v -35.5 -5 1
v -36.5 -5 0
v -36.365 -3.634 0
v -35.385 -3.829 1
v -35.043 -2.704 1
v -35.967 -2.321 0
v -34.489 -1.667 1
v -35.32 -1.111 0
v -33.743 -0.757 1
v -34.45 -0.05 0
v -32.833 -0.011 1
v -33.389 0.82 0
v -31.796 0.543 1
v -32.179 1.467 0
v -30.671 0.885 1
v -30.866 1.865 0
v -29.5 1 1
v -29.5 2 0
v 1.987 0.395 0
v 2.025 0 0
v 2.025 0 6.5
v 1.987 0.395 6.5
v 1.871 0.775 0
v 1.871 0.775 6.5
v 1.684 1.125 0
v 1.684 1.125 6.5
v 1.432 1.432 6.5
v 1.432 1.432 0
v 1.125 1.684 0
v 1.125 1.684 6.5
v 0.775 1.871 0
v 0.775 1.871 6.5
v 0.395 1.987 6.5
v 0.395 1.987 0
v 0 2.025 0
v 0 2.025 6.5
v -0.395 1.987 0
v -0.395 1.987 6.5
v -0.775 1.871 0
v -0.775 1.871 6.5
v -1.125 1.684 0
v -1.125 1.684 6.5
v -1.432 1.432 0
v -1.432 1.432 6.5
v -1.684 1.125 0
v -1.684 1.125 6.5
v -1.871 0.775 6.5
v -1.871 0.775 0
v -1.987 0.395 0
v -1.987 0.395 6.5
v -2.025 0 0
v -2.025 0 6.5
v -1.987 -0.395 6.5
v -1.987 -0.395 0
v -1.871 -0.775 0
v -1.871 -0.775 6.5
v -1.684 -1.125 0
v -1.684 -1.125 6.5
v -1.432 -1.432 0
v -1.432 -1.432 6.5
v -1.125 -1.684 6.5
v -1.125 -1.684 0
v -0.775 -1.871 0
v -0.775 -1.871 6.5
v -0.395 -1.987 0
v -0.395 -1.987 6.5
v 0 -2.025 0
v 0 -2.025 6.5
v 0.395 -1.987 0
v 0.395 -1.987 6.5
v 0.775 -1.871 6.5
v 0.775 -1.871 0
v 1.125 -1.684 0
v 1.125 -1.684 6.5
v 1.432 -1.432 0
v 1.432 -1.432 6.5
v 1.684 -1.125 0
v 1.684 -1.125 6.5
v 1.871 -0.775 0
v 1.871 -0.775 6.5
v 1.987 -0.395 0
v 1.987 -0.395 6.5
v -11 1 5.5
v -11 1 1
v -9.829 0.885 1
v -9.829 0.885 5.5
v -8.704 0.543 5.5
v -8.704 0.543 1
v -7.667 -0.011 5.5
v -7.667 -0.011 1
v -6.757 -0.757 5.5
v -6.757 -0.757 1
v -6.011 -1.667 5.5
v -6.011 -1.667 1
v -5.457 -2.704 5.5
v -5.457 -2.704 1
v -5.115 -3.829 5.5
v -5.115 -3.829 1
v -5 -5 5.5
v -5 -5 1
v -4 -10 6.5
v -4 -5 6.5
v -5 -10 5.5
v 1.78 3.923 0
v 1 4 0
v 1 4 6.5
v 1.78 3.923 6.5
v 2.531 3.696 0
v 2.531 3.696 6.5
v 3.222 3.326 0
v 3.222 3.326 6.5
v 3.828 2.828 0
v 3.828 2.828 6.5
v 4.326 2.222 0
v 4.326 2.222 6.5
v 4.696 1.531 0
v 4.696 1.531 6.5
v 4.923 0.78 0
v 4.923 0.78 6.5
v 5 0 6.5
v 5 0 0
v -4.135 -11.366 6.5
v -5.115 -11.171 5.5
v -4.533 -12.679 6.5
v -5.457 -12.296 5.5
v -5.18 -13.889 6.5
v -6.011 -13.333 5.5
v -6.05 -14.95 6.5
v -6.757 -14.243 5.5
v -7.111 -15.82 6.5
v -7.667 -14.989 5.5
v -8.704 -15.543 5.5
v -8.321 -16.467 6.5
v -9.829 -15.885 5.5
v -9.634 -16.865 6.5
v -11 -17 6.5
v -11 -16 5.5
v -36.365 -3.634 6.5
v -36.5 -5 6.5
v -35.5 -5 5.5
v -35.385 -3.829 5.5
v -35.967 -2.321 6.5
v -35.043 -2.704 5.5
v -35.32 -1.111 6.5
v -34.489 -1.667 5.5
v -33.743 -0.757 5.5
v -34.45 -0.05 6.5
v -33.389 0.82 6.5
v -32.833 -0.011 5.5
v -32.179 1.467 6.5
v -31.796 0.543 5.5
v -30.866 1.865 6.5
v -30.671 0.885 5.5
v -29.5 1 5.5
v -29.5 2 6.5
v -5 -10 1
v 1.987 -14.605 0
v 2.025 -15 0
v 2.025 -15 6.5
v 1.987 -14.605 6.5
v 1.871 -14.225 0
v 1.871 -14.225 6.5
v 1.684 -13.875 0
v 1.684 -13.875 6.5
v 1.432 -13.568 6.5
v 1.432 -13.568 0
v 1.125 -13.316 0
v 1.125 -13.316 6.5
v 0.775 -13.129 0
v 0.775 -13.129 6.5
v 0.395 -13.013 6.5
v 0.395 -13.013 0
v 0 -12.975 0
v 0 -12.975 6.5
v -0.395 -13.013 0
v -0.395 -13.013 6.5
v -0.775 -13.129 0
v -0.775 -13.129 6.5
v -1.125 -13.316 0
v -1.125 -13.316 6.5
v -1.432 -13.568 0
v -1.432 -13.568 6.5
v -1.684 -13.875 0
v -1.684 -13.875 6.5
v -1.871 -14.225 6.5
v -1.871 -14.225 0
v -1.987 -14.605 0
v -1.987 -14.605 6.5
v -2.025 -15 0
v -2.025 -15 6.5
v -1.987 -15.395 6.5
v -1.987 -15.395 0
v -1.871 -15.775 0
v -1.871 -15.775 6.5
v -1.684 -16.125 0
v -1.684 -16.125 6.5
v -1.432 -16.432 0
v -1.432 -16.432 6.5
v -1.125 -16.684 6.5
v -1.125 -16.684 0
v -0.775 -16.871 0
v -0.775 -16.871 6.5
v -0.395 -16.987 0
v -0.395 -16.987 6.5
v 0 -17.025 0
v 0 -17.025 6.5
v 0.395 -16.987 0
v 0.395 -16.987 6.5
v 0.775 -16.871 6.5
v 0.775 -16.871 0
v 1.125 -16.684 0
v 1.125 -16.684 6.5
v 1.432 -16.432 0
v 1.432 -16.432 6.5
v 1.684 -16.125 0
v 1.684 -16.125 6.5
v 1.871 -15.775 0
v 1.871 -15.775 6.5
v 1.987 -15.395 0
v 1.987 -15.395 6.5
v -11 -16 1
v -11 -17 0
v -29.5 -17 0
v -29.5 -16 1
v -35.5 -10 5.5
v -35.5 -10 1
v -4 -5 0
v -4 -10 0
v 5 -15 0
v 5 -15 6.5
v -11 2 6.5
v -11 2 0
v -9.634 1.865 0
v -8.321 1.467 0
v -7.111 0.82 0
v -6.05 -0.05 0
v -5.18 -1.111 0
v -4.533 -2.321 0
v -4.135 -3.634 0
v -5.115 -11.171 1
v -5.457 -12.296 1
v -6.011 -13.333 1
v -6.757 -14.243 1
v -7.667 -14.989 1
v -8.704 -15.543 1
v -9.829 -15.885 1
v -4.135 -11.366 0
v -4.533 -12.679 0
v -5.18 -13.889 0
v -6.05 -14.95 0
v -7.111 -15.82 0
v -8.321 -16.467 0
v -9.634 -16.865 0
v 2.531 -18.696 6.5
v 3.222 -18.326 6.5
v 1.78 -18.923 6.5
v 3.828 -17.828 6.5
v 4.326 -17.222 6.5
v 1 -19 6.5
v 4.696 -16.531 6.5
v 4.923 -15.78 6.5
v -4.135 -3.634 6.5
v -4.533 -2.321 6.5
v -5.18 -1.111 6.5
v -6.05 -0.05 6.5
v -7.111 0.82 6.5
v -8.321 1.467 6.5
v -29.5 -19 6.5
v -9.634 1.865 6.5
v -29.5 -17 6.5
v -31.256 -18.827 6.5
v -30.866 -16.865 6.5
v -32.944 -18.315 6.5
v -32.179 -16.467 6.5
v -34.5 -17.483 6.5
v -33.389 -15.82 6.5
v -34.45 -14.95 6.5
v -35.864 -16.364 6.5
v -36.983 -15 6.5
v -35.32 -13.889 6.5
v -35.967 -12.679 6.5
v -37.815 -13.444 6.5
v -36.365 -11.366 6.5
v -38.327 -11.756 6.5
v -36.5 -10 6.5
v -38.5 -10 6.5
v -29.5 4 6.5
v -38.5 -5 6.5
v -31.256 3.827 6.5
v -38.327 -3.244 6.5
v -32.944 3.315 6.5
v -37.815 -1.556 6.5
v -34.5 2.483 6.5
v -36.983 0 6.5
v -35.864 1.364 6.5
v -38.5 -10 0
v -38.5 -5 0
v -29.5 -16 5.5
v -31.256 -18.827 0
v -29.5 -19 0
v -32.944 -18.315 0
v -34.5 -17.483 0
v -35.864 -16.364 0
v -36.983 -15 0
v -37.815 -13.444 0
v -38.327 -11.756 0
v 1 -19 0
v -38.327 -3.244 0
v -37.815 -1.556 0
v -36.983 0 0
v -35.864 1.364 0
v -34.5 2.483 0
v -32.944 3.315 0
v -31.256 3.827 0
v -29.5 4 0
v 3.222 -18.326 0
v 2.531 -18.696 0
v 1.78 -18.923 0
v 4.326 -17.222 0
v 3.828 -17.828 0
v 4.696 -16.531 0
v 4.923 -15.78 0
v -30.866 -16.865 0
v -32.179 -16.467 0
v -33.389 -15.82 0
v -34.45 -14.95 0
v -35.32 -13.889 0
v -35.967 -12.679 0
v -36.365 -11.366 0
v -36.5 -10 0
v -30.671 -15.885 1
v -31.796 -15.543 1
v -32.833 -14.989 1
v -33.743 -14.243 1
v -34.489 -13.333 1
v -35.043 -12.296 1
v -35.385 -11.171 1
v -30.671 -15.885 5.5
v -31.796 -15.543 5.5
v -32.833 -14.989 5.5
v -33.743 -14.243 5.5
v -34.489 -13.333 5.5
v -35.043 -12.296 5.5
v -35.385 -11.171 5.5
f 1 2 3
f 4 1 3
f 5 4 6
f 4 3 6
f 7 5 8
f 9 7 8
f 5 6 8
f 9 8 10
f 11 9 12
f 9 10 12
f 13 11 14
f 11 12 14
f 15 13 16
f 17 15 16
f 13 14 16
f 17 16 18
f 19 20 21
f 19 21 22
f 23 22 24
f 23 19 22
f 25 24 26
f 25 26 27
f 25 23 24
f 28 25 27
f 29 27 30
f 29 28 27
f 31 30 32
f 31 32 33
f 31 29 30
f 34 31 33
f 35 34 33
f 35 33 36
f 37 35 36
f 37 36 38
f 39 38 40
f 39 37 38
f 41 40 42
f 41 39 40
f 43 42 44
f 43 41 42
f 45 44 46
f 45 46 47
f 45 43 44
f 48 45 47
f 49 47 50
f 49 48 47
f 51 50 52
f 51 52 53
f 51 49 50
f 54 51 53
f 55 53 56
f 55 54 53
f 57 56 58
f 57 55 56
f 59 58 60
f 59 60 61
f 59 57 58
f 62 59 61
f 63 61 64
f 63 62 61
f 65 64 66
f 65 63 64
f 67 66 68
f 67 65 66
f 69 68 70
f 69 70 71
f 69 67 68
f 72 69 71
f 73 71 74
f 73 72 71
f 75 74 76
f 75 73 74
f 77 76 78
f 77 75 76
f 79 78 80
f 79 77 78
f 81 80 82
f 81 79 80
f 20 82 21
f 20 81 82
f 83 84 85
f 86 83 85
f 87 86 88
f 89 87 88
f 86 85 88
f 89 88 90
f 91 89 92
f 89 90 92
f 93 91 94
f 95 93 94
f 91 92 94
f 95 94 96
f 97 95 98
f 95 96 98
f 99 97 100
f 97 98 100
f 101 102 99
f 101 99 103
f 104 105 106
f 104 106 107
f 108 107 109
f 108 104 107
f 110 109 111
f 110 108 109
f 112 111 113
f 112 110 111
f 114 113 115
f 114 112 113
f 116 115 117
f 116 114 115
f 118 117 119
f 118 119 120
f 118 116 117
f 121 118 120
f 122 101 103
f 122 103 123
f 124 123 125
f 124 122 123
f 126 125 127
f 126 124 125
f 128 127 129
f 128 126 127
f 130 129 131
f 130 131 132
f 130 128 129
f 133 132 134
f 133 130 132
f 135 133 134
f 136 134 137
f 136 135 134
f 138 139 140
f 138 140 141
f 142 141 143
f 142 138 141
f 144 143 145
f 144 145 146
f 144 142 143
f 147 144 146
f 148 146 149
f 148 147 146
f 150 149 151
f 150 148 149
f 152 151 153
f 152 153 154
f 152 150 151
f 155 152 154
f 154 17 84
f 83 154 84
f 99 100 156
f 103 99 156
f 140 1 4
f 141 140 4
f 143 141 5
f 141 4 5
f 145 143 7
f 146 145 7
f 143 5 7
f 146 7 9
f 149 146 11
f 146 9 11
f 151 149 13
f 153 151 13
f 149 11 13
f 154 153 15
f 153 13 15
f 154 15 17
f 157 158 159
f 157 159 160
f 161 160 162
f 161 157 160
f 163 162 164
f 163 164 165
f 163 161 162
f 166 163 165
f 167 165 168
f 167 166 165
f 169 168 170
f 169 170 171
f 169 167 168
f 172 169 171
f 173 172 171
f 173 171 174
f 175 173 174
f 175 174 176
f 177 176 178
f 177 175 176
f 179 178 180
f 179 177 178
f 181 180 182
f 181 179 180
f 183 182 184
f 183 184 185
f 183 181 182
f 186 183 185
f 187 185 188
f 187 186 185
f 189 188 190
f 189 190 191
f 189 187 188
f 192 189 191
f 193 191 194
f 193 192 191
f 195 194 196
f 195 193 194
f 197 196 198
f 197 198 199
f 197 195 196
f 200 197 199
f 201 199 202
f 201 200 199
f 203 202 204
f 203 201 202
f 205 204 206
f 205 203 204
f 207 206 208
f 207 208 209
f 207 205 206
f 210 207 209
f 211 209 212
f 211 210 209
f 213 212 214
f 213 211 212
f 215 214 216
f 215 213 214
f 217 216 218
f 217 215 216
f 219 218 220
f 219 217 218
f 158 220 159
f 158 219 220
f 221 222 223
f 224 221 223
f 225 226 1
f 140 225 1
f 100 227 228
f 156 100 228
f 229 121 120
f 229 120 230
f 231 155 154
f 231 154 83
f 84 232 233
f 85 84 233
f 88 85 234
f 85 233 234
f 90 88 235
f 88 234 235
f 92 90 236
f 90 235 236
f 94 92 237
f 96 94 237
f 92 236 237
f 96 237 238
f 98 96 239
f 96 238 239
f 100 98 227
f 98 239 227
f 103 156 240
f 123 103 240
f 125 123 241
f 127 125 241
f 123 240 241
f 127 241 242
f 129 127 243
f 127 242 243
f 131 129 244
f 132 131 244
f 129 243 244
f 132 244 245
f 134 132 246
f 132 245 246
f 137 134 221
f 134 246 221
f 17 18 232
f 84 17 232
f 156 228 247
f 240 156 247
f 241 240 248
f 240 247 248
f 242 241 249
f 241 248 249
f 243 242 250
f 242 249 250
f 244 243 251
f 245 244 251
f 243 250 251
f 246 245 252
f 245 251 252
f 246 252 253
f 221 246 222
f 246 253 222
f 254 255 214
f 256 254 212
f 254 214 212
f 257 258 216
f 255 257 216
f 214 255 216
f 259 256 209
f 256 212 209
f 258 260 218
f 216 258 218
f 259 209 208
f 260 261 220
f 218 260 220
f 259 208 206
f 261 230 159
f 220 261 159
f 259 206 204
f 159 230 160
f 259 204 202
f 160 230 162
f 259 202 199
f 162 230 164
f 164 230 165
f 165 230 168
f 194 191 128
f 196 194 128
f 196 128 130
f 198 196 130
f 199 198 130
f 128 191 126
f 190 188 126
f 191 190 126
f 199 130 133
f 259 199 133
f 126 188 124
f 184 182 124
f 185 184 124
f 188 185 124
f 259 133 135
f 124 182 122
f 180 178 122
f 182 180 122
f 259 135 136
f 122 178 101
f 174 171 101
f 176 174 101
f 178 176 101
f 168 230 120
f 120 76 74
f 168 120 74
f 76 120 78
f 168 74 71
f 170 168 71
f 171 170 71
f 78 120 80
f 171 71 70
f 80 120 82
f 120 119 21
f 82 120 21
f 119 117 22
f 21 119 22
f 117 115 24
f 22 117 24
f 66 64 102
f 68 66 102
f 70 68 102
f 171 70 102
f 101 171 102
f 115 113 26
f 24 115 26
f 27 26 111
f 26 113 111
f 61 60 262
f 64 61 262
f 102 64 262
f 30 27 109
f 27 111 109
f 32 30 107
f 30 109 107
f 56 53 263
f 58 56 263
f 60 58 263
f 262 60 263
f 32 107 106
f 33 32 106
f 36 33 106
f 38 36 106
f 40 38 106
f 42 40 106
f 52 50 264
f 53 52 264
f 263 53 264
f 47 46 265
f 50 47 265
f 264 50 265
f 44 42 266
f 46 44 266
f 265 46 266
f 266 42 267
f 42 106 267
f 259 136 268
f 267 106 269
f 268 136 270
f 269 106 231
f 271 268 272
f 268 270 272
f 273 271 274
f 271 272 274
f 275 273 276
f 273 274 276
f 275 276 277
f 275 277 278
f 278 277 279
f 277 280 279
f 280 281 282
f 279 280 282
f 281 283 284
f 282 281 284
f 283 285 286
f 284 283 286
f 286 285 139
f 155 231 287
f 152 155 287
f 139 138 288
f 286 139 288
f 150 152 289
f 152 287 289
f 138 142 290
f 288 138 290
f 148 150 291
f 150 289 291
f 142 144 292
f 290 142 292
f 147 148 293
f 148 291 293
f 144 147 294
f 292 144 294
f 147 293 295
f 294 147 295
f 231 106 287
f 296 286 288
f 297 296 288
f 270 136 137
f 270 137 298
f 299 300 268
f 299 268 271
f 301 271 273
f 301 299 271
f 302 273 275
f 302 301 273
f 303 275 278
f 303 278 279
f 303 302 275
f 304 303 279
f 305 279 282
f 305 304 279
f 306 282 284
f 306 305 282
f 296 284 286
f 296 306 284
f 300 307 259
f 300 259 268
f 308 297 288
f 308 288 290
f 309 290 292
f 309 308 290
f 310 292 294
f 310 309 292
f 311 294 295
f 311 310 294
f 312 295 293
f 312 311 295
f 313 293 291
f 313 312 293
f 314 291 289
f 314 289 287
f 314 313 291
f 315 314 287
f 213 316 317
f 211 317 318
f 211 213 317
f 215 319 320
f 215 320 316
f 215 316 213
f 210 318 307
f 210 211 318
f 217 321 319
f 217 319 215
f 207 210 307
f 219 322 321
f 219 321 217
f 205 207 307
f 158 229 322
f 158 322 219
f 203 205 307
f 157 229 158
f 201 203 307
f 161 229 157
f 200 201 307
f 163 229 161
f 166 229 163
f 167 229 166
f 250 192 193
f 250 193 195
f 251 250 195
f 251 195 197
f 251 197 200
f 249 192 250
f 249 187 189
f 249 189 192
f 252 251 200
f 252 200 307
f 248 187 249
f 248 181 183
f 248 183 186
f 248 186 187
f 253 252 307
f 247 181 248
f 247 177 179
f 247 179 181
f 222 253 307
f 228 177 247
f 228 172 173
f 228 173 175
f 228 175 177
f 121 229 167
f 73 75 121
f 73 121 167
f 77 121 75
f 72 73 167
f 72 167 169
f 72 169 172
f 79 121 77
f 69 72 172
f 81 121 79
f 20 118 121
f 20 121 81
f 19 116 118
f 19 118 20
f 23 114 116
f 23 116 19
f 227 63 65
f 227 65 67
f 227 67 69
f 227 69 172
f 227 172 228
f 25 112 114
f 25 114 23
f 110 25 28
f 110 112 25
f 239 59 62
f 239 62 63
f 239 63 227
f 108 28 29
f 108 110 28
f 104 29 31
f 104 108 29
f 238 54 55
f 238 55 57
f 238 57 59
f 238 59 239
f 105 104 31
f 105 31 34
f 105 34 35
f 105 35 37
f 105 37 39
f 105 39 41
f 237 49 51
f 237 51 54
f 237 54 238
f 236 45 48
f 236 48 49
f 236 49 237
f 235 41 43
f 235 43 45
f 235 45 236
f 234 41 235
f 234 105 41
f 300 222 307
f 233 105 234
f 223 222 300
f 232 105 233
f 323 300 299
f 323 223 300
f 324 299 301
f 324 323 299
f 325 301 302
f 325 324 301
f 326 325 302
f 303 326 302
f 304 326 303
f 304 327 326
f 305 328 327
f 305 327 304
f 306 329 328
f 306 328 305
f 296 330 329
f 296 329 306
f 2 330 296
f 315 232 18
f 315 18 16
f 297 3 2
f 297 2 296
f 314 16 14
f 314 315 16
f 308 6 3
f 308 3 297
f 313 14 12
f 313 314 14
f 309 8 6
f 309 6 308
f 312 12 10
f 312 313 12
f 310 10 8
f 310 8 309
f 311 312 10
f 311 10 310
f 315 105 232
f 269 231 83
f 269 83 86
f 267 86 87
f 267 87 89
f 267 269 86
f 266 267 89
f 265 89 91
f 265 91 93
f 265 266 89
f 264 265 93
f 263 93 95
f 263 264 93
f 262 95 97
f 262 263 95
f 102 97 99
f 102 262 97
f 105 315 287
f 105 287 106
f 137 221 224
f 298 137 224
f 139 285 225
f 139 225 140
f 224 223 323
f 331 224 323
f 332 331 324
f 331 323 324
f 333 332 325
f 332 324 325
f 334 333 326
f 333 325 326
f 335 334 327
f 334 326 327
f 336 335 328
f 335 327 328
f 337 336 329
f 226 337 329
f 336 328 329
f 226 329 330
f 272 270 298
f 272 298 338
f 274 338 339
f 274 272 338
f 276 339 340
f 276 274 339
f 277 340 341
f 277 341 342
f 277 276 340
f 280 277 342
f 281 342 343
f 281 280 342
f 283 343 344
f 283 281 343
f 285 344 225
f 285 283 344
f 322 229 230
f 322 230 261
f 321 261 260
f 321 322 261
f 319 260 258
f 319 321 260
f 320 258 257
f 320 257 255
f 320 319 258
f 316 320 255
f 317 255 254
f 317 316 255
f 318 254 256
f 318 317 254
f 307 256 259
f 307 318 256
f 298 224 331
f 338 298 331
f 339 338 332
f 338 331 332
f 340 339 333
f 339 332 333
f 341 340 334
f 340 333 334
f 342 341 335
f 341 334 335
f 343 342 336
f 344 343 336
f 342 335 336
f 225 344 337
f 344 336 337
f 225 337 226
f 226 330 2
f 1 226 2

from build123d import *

# Parameters (mm, degrees)
SKETCH1_R           = 2.025483479
BOSS_EXTRUDE1_DEPTH = 6.5
CHAMFER1_SIZE       = 1


with BuildPart() as part:
    # Sketch1 → Boss-Extrude1 (new body)
    with BuildSketch(Plane.XY):
        with BuildLine():
            Line((-29.5, 4), (1, 4))
            ThreePointArc((1, 4), (3.828427125, 2.828427125), (5, 0))
            Line((5, 0), (5, -15))
            ThreePointArc((5, -15), (3.828427125, -17.828427125), (1, -19))
            Line((1, -19), (-29.5, -19))
            ThreePointArc((-29.5, -19), (-35.863961031, -16.363961031), (-38.5, -10))
            Line((-38.5, -10), (-38.5, -5))
            ThreePointArc((-38.5, -5), (-35.863961031, 1.363961031), (-29.5, 4))
        make_face()
        Circle(SKETCH1_R, mode=Mode.SUBTRACT)
        with Locations((0, -15)):
            Circle(SKETCH1_R, mode=Mode.SUBTRACT)
        with BuildLine():
            Line((-29.5, 1), (-11, 1))
            ThreePointArc((-11, 1), (-6.757359313, -0.757359313), (-5, -5))
            Line((-5, -5), (-5, -10))
            ThreePointArc((-5, -10), (-6.757359313, -14.242640687), (-11, -16))
            Line((-11, -16), (-29.5, -16))
            ThreePointArc((-29.5, -16), (-33.742640687, -14.242640687), (-35.5, -10))
            Line((-35.5, -10), (-35.5, -5))
            ThreePointArc((-35.5, -5), (-33.742640687, -0.757359313), (-29.5, 1))
        make_face(mode=Mode.SUBTRACT)
    extrude(amount=BOSS_EXTRUDE1_DEPTH)

    # Chamfer1
    chamfer1_edges = [part.edges().sort_by_distance(p)[0] for p in [
        (-6.757359313, -0.757359313, 0),
        (-20.25, 1, 0),
        (-33.742640687, -0.757359313, 0),
        (-35.5, -7.5, 0),
        (-33.742640687, -14.242640687, 0),
        (-20.25, -16, 0),
        (-6.757359313, -14.242640687, 0),
        (-5, -7.5, 0),
        (-6.757359313, -0.757359313, 6.5),
        (-20.25, 1, 6.5),
        (-33.742640687, -0.757359313, 6.5),
        (-35.5, -7.5, 6.5),
        (-33.742640687, -14.242640687, 6.5),
        (-20.25, -16, 6.5),
        (-6.757359313, -14.242640687, 6.5),
        (-5, -7.5, 6.5),
    ]]
    chamfer(chamfer1_edges, length=CHAMFER1_SIZE)


solid = part.part
